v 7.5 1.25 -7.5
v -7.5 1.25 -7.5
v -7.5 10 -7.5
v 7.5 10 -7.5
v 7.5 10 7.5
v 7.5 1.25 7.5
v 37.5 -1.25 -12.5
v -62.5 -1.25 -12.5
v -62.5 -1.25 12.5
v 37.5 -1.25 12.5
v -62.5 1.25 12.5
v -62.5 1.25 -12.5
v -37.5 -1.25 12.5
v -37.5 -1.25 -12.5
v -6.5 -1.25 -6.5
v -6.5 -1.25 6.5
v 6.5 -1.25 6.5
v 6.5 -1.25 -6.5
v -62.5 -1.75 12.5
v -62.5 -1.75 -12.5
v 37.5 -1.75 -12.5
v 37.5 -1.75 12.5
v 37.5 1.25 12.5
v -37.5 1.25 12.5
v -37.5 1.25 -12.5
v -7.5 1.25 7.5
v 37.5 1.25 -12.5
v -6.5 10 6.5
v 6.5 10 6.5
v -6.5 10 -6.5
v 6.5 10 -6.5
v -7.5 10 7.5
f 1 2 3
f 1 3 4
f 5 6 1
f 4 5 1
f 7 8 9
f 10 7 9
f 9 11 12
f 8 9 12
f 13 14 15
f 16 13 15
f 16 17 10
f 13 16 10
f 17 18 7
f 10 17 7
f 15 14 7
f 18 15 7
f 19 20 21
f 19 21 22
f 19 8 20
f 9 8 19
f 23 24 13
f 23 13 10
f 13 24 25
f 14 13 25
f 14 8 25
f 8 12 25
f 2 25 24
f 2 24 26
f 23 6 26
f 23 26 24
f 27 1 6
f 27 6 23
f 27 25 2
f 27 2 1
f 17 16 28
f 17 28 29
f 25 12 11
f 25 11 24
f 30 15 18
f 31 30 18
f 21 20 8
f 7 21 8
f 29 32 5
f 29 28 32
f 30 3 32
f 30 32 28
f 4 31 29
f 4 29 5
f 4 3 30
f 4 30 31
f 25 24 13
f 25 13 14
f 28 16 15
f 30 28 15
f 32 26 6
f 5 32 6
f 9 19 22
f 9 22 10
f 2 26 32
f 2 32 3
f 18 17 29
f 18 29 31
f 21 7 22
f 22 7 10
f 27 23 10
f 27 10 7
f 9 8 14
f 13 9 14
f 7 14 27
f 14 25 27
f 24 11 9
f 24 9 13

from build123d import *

# Parameters (mm, degrees)
SKETCH1_W           = 75
SKETCH1_H           = 25
SLIDE_DEPTH         = 1.25
SKETCH4_W           = 25
SKETCH4_H           = 25
LABEL_DEPTH         = 1.25
SKETCH5_W           = 15
SKETCH5_H           = 15
SKETCH5_W_2         = 13
SKETCH5_H_2         = 13
BOSS_EXTRUDE1_DEPTH = 10
SKETCH6_W           = 13
SKETCH6_H           = 13
CUT_EXTRUDE1_DEPTH  = 2.5
SKETCH7_W           = 25
SKETCH7_H           = 0.5
BOSS_EXTRUDE2_DEPTH = 100


with BuildPart() as part:
    # Sketch1 → Slide (new body, symmetric)
    with BuildSketch(Plane(origin=(0, 0, 0), x_dir=(1, 0, 0), z_dir=(0, 1, 0))):
        Rectangle(SKETCH1_W, SKETCH1_H)
    extrude(amount=SLIDE_DEPTH, both=True)

    # Sketch5 → Boss-Extrude1 (add)
    with BuildSketch(Plane(origin=(0, 0, 0), x_dir=(1, 0, 0), z_dir=(0, 1, 0))):
        Rectangle(SKETCH5_W, SKETCH5_H)
        Rectangle(SKETCH5_W_2, SKETCH5_H_2, mode=Mode.SUBTRACT)
    extrude(amount=BOSS_EXTRUDE1_DEPTH)

    # Sketch6 → Cut-Extrude1 (cut)
    with BuildSketch(Plane(origin=(0, 1.25, 0), x_dir=(1, 0, 0), z_dir=(0, 1, 0))):
        Rectangle(SKETCH6_W, SKETCH6_H)
    extrude(amount=-CUT_EXTRUDE1_DEPTH, mode=Mode.SUBTRACT)


with BuildPart() as body_2:
    # Sketch4 → Label (new body, symmetric)
    with BuildSketch(Plane(origin=(0, 0, 0), x_dir=(1, 0, 0), z_dir=(0, 1, 0))):
        with Locations((-50, 0)):
            Rectangle(SKETCH4_W, SKETCH4_H)
    extrude(amount=LABEL_DEPTH, both=True)


with BuildPart() as body_3:
    # Sketch7 → Boss-Extrude2 (new body)
    with BuildSketch(Plane.ZY.offset(62.5)):
        with Locations((0, -1.5)):
            Rectangle(SKETCH7_W, SKETCH7_H)
    extrude(amount=-BOSS_EXTRUDE2_DEPTH)


solid = Compound([part.part, body_2.part, body_3.part])
